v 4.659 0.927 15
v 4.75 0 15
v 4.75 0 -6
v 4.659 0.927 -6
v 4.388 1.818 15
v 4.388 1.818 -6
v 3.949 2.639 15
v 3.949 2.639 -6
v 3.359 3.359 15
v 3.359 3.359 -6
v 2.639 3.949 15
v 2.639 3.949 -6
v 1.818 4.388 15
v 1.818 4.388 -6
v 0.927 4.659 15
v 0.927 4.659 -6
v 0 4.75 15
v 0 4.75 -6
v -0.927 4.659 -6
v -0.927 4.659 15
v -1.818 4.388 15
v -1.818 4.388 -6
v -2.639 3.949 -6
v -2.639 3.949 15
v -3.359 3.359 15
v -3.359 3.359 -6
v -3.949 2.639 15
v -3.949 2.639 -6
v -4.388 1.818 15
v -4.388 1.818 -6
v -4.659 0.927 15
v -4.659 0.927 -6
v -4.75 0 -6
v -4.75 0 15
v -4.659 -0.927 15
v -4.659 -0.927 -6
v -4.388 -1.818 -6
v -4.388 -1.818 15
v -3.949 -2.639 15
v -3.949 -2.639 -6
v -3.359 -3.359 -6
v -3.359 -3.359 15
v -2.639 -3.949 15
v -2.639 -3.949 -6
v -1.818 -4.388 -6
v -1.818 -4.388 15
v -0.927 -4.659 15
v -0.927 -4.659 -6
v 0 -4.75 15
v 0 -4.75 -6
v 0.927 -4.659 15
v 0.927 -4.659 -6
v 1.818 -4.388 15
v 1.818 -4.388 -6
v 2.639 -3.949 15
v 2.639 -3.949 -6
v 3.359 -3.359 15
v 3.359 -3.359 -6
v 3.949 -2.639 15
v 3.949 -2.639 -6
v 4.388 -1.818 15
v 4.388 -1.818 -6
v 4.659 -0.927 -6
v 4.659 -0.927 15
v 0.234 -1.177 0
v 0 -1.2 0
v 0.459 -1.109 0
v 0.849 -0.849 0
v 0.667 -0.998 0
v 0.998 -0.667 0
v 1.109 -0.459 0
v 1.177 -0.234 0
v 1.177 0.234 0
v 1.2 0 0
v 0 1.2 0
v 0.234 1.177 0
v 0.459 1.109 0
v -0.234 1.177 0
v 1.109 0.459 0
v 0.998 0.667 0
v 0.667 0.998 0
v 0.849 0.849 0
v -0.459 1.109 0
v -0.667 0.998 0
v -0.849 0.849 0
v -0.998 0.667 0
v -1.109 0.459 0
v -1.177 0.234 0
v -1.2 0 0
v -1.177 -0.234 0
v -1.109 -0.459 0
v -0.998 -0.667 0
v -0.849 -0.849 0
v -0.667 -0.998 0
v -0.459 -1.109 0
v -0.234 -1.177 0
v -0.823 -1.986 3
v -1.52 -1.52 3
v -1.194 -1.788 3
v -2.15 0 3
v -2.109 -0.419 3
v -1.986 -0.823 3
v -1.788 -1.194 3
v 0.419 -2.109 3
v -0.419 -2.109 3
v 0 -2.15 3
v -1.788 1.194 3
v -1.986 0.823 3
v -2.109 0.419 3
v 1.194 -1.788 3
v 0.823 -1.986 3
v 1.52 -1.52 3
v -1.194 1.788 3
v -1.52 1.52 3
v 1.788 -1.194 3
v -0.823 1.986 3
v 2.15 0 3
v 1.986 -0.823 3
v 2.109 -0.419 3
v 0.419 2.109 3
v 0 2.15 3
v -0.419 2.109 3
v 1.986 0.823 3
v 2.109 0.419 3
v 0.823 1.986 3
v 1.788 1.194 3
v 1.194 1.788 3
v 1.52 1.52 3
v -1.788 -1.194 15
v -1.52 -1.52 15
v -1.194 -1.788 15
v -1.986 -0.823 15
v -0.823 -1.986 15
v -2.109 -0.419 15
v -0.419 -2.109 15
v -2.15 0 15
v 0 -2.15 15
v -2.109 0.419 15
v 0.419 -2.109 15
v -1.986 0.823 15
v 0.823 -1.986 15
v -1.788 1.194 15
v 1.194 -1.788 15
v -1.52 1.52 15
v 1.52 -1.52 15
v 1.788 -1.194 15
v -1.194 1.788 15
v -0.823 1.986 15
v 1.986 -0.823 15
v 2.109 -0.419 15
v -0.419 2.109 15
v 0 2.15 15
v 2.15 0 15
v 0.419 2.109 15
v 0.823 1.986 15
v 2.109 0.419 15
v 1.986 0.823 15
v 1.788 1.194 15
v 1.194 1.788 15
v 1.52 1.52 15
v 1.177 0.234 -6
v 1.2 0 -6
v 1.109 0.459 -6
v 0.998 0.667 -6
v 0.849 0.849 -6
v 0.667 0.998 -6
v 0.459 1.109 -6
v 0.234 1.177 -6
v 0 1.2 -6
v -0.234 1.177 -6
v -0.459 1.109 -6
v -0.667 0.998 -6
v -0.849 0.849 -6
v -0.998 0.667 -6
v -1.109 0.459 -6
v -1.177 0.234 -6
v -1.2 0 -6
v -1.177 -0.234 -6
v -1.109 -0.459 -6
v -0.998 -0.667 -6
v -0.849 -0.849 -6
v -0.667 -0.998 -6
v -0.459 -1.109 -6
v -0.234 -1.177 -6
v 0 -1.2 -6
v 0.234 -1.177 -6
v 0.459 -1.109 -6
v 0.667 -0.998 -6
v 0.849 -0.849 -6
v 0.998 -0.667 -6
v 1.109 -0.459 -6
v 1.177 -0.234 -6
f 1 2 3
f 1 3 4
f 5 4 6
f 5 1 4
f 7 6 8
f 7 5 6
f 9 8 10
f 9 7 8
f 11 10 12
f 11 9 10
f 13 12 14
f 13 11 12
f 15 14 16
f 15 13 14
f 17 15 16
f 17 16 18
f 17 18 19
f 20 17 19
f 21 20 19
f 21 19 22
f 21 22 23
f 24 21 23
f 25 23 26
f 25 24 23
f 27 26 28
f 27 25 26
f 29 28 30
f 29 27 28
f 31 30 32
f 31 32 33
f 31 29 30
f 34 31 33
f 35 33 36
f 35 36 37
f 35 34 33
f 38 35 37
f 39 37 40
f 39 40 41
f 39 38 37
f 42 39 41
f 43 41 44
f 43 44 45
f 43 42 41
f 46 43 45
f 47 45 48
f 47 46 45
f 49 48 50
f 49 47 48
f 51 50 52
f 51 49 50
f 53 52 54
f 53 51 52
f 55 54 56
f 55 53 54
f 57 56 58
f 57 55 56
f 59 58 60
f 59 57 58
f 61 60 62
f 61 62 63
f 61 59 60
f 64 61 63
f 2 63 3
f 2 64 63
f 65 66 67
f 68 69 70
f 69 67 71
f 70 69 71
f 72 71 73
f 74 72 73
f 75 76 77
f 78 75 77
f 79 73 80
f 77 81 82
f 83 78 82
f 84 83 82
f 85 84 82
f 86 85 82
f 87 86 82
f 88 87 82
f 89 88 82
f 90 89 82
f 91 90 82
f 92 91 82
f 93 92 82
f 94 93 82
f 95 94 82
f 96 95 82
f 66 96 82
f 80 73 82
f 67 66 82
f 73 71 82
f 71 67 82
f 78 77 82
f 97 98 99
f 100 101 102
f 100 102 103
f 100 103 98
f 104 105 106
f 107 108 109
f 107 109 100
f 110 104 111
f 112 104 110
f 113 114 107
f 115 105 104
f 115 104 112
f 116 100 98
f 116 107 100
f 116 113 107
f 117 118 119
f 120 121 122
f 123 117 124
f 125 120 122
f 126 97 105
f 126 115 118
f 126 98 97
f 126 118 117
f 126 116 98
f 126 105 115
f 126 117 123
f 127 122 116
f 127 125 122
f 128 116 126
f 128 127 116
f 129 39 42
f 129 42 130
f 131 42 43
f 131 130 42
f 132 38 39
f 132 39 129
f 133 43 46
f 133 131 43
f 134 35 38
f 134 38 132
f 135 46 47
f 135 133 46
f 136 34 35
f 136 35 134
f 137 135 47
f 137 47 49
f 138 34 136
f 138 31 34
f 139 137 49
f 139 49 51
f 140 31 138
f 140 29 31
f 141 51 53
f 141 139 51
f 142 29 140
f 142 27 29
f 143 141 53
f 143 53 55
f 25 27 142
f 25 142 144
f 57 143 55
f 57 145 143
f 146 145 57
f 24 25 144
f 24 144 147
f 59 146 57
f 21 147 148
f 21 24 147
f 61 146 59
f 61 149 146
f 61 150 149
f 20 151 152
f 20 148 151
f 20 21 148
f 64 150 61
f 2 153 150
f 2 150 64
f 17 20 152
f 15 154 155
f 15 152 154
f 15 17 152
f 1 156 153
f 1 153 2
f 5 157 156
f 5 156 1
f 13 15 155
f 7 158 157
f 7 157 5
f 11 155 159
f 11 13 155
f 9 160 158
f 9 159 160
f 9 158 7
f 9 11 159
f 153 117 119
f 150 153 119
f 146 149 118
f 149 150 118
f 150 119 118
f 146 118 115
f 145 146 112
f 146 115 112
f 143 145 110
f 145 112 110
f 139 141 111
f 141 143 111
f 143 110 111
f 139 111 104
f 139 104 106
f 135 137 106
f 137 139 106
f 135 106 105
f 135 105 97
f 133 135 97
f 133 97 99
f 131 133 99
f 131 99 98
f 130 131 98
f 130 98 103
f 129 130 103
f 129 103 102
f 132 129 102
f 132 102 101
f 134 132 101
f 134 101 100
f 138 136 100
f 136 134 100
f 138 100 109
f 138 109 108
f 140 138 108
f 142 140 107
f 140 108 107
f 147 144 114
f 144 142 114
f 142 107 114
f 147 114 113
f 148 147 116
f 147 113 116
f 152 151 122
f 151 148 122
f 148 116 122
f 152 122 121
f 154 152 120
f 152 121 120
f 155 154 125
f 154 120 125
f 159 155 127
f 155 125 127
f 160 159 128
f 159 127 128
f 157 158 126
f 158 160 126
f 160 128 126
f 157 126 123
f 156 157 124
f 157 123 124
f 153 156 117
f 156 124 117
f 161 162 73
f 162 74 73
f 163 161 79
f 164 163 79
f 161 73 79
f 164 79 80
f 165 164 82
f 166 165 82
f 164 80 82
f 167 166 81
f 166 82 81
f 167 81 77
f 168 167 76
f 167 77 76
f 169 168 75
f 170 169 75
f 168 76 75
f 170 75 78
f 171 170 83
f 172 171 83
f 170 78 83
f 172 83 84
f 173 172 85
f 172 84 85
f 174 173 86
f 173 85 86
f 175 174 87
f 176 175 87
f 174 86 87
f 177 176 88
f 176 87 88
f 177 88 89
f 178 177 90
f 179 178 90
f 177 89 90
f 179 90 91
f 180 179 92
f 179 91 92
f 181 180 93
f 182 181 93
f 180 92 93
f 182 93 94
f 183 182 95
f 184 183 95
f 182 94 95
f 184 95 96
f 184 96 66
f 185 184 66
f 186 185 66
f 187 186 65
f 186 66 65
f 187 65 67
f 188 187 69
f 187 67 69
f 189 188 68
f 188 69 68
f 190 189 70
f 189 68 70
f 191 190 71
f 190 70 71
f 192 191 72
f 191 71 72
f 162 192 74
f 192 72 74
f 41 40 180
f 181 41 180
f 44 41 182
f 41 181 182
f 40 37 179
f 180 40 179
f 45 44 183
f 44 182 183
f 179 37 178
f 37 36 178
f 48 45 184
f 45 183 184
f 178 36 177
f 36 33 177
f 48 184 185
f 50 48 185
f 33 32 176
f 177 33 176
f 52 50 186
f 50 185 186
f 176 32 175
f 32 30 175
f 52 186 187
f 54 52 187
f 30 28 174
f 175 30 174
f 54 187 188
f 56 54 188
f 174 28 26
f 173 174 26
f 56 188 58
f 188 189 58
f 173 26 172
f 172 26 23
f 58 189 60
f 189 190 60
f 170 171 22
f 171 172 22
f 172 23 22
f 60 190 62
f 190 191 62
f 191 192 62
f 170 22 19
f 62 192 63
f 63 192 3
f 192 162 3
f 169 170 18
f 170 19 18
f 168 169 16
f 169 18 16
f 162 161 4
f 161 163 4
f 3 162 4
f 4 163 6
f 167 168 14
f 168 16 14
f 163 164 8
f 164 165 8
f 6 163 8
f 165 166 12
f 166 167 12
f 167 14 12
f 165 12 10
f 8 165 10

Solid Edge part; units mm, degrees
sketch "Sketch1" plane through (0, 0, 0) normal (0, 0, 1) x (1, 0, 0)
  circle A0 centre (0, 0) radius 2.15
extrude "Protrusion1" add sketch "Sketch1" along normal blind 3
sketch "Sketch2" plane through (0, 0, 0) normal (0, 0, 1) x (1, 0, 0)
  circle A0 centre (0, 0) radius 4.75
  circle A1 centre (0, 0) radius 2.15
  dimension "D1" = 9.5
  dimension "D2" = 4.3
  dimension "D3" = 2.4
extrude "ExtrudedProtrusion_2" add sketch "Sketch2" along normal blind 15
sketch "Sketch3" plane through (0, 0, 0) normal (0, 0, 1) x (1, 0, 0)
  circle A0 centre (0, 0) radius 4.75
  circle A1 centre (0, 0) radius 1.2
  dimension "D1" = 9.5
  dimension "D2" = 4.3
  dimension "D3" = 2.4
extrude "ExtrudedProtrusion_3" add sketch "Sketch3" against normal blind 6
